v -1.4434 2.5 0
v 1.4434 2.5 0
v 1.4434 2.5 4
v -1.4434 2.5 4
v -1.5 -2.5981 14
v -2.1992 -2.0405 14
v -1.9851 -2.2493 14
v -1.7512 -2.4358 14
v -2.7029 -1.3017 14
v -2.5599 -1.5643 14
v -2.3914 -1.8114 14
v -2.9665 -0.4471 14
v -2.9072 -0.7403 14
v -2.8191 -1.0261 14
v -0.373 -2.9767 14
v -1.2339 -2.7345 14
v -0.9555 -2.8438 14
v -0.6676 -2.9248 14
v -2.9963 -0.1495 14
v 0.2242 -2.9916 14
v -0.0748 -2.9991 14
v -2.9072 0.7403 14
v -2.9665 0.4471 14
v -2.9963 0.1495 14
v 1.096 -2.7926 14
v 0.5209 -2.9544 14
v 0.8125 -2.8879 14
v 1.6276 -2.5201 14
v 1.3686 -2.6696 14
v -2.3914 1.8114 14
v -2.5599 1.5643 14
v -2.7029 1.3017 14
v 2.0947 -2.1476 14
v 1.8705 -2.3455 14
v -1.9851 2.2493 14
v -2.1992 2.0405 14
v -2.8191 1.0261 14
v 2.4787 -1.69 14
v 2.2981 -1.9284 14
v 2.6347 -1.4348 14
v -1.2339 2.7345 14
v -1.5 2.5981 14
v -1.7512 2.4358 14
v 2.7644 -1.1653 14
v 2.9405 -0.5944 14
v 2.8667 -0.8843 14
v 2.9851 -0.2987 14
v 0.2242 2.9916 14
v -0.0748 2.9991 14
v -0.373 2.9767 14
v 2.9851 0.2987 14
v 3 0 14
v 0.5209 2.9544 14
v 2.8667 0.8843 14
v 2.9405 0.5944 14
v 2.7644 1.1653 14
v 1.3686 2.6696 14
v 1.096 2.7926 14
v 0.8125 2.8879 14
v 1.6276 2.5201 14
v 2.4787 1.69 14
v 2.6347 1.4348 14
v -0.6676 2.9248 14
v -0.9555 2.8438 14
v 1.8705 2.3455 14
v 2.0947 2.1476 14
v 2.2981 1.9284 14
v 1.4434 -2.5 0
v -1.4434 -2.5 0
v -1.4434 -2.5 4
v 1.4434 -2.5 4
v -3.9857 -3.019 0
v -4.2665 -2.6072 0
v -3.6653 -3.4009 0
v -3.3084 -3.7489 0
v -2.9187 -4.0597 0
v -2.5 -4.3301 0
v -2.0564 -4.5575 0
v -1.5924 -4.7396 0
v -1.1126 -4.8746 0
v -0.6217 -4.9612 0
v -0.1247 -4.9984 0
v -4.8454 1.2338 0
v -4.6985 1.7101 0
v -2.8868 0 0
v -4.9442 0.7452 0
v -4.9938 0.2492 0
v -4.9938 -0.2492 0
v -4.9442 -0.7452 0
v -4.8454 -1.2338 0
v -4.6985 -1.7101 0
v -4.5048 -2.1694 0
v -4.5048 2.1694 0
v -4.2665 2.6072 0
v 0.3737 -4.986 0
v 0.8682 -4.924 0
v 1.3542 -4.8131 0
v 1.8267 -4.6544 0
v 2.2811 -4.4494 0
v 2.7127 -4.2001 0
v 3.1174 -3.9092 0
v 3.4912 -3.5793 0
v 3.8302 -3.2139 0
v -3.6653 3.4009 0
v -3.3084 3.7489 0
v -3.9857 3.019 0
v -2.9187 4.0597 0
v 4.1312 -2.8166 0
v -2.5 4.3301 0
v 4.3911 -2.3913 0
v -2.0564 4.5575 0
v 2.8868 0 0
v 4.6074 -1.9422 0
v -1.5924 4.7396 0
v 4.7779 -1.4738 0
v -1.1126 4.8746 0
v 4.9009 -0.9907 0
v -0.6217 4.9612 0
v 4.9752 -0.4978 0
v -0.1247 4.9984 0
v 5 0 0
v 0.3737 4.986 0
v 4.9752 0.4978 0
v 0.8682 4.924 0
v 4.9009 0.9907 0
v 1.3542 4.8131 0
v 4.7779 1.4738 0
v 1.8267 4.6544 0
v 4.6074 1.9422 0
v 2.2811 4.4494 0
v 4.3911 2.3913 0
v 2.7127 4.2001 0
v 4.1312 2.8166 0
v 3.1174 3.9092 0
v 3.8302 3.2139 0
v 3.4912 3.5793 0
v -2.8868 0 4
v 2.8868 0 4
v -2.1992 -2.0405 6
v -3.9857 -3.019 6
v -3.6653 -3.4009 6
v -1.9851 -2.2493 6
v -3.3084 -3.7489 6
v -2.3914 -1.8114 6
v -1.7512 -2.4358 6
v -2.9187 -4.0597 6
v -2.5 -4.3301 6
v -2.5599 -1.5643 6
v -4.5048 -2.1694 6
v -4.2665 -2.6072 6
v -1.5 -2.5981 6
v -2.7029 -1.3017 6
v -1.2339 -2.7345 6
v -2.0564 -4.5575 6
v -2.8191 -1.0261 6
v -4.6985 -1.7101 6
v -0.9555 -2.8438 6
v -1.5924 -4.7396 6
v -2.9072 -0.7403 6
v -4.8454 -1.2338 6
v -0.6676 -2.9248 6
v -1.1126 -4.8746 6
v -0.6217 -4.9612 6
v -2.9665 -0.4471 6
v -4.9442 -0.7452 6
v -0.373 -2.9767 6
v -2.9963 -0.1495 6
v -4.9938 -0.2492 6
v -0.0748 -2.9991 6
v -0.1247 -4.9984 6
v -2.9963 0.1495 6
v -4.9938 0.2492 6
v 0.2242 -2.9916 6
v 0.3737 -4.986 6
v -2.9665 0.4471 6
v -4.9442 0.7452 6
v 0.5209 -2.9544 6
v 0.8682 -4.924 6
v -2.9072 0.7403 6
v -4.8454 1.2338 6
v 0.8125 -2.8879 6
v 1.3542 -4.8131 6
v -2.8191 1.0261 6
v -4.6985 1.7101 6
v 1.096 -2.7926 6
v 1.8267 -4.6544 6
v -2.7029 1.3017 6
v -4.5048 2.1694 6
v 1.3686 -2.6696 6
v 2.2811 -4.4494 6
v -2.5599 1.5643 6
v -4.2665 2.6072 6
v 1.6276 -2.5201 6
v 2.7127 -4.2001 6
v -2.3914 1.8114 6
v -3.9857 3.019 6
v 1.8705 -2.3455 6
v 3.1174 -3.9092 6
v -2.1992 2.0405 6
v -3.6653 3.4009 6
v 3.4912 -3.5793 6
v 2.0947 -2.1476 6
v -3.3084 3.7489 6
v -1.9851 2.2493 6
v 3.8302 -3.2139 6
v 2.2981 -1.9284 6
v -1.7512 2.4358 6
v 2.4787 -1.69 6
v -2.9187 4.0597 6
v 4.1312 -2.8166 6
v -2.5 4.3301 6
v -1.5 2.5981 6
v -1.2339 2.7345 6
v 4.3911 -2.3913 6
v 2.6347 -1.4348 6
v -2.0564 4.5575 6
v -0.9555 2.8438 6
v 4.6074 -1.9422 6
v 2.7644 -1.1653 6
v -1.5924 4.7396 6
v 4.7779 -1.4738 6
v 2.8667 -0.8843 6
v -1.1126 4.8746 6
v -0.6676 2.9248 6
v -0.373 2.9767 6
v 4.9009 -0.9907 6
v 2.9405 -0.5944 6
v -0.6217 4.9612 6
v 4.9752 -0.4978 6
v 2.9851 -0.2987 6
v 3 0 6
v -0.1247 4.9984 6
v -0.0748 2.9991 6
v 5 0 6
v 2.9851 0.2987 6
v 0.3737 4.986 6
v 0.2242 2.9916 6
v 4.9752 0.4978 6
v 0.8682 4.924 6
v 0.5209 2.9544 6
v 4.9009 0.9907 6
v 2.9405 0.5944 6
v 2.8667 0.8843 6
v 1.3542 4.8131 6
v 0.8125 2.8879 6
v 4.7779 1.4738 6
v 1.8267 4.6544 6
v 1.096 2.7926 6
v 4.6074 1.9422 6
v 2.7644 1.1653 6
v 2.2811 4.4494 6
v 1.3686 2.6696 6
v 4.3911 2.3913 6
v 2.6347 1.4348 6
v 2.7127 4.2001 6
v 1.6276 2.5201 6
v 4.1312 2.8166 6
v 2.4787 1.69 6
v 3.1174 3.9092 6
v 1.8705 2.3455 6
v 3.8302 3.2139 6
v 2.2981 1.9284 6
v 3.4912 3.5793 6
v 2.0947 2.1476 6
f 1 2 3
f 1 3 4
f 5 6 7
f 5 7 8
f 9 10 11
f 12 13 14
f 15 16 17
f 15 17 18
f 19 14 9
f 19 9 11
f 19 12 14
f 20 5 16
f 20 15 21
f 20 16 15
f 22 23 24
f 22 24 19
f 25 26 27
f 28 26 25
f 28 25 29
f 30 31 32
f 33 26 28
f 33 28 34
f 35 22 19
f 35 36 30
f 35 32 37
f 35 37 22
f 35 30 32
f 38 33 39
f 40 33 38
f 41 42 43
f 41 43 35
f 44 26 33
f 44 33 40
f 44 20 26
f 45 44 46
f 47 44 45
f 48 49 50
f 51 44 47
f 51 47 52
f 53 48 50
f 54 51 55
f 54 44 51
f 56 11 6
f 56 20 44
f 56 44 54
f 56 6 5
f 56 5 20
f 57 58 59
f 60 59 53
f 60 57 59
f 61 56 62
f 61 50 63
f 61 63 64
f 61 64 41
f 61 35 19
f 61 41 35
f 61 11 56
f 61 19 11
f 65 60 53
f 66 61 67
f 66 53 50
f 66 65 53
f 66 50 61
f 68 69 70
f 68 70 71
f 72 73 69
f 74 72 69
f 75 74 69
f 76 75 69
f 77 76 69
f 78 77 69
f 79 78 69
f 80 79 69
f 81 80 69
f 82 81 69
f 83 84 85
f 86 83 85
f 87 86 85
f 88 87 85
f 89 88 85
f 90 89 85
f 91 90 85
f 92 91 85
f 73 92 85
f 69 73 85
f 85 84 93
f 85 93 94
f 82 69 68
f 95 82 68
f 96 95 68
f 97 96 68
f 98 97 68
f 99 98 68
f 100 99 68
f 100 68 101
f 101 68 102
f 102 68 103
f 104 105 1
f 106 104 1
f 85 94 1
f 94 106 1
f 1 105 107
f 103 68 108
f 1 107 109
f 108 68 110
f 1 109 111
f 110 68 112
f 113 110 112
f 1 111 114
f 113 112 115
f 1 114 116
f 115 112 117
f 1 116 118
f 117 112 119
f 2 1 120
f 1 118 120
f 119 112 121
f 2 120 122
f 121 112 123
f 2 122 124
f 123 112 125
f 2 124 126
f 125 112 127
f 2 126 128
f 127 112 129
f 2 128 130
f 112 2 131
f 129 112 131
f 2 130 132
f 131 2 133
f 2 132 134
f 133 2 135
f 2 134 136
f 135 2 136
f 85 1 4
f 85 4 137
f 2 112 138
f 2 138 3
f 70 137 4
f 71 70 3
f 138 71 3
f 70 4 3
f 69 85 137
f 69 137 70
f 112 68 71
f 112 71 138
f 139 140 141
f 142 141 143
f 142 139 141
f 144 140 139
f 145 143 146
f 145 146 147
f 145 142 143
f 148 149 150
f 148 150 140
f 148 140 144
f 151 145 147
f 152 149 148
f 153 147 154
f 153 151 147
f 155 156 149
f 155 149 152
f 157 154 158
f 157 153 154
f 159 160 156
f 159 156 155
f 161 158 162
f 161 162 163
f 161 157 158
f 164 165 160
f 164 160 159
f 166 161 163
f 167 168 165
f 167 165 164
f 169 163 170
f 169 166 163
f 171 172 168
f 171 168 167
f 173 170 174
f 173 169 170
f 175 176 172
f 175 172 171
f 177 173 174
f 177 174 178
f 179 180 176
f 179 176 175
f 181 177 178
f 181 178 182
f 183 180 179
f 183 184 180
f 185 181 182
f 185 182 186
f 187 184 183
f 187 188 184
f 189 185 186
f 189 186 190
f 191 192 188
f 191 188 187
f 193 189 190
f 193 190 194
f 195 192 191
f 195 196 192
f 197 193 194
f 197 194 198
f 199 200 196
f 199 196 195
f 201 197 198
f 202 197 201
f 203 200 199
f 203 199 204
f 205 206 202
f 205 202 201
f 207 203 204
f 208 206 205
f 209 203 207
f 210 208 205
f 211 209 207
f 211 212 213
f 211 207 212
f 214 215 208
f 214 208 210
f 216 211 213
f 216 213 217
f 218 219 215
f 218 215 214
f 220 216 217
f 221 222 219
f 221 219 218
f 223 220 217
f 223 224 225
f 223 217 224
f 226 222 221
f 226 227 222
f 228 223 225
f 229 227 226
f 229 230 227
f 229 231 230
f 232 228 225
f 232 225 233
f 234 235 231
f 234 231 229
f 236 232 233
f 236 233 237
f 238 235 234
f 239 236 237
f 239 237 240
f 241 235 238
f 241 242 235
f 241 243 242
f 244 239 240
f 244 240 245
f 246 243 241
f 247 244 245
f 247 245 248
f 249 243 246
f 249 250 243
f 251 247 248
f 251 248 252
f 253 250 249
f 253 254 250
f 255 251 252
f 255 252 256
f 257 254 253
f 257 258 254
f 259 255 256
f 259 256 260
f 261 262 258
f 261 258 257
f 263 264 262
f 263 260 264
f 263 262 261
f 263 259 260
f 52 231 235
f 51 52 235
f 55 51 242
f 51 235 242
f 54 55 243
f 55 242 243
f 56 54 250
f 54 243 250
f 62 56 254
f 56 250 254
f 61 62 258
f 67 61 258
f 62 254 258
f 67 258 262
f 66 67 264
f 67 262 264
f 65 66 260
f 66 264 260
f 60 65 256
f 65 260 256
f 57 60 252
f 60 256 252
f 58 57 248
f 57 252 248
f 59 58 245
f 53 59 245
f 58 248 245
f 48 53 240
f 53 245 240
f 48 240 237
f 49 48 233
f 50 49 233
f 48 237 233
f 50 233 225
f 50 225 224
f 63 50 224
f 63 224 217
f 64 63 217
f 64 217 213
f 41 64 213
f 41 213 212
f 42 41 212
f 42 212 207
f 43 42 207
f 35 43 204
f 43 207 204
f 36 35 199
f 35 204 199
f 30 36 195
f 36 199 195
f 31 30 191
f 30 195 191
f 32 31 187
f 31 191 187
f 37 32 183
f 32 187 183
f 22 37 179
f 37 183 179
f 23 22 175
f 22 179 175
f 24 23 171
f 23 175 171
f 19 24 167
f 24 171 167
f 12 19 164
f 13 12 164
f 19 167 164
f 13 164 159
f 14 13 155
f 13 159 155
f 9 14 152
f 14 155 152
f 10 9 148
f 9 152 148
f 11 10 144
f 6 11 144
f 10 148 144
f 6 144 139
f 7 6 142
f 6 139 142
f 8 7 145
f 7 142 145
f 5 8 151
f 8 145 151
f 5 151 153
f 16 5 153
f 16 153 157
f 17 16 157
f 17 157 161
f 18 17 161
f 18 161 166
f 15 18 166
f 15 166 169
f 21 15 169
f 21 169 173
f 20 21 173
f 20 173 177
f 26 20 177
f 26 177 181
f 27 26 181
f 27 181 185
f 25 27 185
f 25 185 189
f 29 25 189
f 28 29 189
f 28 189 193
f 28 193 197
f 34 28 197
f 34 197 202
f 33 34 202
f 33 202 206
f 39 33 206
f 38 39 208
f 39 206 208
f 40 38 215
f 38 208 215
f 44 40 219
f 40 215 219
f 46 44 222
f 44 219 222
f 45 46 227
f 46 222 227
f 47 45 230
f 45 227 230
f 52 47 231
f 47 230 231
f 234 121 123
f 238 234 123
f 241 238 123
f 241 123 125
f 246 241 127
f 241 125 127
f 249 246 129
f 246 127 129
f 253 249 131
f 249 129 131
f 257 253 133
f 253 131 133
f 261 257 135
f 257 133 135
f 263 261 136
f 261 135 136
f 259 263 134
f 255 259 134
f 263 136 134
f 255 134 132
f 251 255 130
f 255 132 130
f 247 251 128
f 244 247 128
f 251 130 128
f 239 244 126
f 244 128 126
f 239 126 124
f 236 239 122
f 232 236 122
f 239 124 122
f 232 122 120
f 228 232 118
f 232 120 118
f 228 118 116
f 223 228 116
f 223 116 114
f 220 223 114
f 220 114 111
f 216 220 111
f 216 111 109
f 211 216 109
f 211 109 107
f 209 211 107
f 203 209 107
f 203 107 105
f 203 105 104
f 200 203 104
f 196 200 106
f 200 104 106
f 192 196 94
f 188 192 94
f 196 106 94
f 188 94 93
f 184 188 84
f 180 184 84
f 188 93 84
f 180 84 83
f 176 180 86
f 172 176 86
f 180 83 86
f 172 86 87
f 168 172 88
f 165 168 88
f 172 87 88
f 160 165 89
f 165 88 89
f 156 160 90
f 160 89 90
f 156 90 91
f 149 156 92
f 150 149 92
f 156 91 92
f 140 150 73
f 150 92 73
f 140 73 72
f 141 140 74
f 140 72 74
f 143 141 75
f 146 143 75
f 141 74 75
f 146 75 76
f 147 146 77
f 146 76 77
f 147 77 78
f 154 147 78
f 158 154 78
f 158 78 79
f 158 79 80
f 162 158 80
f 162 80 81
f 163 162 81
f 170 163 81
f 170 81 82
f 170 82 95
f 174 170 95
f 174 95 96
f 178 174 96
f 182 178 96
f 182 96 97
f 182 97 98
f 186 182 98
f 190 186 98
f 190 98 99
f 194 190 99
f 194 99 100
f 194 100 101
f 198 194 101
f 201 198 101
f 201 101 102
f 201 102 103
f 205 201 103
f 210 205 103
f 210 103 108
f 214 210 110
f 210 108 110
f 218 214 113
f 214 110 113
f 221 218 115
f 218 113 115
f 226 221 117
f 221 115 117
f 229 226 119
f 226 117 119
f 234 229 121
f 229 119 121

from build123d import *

# Parameters (mm, degrees)
ESBO_O1_R                = 5
RESSALTO_EXTRUS_O1_DEPTH = 6
ESBO_O2_R                = 3
RESSALTO_EXTRUS_O2_DEPTH = 8
CORTE_EXTRUS_O1_DEPTH    = 4


with BuildPart() as part:
    # Esboço1 → Ressalto-extrusão1 (new body)
    with BuildSketch(Plane.XY):
        Circle(ESBO_O1_R)
    extrude(amount=RESSALTO_EXTRUS_O1_DEPTH)

    # Esboço2 → Ressalto-extrusão2 (add)
    with BuildSketch(Plane.XY.offset(6)):
        Circle(ESBO_O2_R)
    extrude(amount=RESSALTO_EXTRUS_O2_DEPTH)

    # Esboço1<4> → Corte-extrusão1 (cut)
    with BuildSketch(Plane.XY):
        Polygon((-1.443375673, 2.5), (-2.886751346, 0), (-1.443375673, -2.5), (1.443375673, -2.5), (2.886751346, 0), (1.443375673, 2.5), align=None)
    extrude(amount=CORTE_EXTRUS_O1_DEPTH, mode=Mode.SUBTRACT)


solid = part.part
